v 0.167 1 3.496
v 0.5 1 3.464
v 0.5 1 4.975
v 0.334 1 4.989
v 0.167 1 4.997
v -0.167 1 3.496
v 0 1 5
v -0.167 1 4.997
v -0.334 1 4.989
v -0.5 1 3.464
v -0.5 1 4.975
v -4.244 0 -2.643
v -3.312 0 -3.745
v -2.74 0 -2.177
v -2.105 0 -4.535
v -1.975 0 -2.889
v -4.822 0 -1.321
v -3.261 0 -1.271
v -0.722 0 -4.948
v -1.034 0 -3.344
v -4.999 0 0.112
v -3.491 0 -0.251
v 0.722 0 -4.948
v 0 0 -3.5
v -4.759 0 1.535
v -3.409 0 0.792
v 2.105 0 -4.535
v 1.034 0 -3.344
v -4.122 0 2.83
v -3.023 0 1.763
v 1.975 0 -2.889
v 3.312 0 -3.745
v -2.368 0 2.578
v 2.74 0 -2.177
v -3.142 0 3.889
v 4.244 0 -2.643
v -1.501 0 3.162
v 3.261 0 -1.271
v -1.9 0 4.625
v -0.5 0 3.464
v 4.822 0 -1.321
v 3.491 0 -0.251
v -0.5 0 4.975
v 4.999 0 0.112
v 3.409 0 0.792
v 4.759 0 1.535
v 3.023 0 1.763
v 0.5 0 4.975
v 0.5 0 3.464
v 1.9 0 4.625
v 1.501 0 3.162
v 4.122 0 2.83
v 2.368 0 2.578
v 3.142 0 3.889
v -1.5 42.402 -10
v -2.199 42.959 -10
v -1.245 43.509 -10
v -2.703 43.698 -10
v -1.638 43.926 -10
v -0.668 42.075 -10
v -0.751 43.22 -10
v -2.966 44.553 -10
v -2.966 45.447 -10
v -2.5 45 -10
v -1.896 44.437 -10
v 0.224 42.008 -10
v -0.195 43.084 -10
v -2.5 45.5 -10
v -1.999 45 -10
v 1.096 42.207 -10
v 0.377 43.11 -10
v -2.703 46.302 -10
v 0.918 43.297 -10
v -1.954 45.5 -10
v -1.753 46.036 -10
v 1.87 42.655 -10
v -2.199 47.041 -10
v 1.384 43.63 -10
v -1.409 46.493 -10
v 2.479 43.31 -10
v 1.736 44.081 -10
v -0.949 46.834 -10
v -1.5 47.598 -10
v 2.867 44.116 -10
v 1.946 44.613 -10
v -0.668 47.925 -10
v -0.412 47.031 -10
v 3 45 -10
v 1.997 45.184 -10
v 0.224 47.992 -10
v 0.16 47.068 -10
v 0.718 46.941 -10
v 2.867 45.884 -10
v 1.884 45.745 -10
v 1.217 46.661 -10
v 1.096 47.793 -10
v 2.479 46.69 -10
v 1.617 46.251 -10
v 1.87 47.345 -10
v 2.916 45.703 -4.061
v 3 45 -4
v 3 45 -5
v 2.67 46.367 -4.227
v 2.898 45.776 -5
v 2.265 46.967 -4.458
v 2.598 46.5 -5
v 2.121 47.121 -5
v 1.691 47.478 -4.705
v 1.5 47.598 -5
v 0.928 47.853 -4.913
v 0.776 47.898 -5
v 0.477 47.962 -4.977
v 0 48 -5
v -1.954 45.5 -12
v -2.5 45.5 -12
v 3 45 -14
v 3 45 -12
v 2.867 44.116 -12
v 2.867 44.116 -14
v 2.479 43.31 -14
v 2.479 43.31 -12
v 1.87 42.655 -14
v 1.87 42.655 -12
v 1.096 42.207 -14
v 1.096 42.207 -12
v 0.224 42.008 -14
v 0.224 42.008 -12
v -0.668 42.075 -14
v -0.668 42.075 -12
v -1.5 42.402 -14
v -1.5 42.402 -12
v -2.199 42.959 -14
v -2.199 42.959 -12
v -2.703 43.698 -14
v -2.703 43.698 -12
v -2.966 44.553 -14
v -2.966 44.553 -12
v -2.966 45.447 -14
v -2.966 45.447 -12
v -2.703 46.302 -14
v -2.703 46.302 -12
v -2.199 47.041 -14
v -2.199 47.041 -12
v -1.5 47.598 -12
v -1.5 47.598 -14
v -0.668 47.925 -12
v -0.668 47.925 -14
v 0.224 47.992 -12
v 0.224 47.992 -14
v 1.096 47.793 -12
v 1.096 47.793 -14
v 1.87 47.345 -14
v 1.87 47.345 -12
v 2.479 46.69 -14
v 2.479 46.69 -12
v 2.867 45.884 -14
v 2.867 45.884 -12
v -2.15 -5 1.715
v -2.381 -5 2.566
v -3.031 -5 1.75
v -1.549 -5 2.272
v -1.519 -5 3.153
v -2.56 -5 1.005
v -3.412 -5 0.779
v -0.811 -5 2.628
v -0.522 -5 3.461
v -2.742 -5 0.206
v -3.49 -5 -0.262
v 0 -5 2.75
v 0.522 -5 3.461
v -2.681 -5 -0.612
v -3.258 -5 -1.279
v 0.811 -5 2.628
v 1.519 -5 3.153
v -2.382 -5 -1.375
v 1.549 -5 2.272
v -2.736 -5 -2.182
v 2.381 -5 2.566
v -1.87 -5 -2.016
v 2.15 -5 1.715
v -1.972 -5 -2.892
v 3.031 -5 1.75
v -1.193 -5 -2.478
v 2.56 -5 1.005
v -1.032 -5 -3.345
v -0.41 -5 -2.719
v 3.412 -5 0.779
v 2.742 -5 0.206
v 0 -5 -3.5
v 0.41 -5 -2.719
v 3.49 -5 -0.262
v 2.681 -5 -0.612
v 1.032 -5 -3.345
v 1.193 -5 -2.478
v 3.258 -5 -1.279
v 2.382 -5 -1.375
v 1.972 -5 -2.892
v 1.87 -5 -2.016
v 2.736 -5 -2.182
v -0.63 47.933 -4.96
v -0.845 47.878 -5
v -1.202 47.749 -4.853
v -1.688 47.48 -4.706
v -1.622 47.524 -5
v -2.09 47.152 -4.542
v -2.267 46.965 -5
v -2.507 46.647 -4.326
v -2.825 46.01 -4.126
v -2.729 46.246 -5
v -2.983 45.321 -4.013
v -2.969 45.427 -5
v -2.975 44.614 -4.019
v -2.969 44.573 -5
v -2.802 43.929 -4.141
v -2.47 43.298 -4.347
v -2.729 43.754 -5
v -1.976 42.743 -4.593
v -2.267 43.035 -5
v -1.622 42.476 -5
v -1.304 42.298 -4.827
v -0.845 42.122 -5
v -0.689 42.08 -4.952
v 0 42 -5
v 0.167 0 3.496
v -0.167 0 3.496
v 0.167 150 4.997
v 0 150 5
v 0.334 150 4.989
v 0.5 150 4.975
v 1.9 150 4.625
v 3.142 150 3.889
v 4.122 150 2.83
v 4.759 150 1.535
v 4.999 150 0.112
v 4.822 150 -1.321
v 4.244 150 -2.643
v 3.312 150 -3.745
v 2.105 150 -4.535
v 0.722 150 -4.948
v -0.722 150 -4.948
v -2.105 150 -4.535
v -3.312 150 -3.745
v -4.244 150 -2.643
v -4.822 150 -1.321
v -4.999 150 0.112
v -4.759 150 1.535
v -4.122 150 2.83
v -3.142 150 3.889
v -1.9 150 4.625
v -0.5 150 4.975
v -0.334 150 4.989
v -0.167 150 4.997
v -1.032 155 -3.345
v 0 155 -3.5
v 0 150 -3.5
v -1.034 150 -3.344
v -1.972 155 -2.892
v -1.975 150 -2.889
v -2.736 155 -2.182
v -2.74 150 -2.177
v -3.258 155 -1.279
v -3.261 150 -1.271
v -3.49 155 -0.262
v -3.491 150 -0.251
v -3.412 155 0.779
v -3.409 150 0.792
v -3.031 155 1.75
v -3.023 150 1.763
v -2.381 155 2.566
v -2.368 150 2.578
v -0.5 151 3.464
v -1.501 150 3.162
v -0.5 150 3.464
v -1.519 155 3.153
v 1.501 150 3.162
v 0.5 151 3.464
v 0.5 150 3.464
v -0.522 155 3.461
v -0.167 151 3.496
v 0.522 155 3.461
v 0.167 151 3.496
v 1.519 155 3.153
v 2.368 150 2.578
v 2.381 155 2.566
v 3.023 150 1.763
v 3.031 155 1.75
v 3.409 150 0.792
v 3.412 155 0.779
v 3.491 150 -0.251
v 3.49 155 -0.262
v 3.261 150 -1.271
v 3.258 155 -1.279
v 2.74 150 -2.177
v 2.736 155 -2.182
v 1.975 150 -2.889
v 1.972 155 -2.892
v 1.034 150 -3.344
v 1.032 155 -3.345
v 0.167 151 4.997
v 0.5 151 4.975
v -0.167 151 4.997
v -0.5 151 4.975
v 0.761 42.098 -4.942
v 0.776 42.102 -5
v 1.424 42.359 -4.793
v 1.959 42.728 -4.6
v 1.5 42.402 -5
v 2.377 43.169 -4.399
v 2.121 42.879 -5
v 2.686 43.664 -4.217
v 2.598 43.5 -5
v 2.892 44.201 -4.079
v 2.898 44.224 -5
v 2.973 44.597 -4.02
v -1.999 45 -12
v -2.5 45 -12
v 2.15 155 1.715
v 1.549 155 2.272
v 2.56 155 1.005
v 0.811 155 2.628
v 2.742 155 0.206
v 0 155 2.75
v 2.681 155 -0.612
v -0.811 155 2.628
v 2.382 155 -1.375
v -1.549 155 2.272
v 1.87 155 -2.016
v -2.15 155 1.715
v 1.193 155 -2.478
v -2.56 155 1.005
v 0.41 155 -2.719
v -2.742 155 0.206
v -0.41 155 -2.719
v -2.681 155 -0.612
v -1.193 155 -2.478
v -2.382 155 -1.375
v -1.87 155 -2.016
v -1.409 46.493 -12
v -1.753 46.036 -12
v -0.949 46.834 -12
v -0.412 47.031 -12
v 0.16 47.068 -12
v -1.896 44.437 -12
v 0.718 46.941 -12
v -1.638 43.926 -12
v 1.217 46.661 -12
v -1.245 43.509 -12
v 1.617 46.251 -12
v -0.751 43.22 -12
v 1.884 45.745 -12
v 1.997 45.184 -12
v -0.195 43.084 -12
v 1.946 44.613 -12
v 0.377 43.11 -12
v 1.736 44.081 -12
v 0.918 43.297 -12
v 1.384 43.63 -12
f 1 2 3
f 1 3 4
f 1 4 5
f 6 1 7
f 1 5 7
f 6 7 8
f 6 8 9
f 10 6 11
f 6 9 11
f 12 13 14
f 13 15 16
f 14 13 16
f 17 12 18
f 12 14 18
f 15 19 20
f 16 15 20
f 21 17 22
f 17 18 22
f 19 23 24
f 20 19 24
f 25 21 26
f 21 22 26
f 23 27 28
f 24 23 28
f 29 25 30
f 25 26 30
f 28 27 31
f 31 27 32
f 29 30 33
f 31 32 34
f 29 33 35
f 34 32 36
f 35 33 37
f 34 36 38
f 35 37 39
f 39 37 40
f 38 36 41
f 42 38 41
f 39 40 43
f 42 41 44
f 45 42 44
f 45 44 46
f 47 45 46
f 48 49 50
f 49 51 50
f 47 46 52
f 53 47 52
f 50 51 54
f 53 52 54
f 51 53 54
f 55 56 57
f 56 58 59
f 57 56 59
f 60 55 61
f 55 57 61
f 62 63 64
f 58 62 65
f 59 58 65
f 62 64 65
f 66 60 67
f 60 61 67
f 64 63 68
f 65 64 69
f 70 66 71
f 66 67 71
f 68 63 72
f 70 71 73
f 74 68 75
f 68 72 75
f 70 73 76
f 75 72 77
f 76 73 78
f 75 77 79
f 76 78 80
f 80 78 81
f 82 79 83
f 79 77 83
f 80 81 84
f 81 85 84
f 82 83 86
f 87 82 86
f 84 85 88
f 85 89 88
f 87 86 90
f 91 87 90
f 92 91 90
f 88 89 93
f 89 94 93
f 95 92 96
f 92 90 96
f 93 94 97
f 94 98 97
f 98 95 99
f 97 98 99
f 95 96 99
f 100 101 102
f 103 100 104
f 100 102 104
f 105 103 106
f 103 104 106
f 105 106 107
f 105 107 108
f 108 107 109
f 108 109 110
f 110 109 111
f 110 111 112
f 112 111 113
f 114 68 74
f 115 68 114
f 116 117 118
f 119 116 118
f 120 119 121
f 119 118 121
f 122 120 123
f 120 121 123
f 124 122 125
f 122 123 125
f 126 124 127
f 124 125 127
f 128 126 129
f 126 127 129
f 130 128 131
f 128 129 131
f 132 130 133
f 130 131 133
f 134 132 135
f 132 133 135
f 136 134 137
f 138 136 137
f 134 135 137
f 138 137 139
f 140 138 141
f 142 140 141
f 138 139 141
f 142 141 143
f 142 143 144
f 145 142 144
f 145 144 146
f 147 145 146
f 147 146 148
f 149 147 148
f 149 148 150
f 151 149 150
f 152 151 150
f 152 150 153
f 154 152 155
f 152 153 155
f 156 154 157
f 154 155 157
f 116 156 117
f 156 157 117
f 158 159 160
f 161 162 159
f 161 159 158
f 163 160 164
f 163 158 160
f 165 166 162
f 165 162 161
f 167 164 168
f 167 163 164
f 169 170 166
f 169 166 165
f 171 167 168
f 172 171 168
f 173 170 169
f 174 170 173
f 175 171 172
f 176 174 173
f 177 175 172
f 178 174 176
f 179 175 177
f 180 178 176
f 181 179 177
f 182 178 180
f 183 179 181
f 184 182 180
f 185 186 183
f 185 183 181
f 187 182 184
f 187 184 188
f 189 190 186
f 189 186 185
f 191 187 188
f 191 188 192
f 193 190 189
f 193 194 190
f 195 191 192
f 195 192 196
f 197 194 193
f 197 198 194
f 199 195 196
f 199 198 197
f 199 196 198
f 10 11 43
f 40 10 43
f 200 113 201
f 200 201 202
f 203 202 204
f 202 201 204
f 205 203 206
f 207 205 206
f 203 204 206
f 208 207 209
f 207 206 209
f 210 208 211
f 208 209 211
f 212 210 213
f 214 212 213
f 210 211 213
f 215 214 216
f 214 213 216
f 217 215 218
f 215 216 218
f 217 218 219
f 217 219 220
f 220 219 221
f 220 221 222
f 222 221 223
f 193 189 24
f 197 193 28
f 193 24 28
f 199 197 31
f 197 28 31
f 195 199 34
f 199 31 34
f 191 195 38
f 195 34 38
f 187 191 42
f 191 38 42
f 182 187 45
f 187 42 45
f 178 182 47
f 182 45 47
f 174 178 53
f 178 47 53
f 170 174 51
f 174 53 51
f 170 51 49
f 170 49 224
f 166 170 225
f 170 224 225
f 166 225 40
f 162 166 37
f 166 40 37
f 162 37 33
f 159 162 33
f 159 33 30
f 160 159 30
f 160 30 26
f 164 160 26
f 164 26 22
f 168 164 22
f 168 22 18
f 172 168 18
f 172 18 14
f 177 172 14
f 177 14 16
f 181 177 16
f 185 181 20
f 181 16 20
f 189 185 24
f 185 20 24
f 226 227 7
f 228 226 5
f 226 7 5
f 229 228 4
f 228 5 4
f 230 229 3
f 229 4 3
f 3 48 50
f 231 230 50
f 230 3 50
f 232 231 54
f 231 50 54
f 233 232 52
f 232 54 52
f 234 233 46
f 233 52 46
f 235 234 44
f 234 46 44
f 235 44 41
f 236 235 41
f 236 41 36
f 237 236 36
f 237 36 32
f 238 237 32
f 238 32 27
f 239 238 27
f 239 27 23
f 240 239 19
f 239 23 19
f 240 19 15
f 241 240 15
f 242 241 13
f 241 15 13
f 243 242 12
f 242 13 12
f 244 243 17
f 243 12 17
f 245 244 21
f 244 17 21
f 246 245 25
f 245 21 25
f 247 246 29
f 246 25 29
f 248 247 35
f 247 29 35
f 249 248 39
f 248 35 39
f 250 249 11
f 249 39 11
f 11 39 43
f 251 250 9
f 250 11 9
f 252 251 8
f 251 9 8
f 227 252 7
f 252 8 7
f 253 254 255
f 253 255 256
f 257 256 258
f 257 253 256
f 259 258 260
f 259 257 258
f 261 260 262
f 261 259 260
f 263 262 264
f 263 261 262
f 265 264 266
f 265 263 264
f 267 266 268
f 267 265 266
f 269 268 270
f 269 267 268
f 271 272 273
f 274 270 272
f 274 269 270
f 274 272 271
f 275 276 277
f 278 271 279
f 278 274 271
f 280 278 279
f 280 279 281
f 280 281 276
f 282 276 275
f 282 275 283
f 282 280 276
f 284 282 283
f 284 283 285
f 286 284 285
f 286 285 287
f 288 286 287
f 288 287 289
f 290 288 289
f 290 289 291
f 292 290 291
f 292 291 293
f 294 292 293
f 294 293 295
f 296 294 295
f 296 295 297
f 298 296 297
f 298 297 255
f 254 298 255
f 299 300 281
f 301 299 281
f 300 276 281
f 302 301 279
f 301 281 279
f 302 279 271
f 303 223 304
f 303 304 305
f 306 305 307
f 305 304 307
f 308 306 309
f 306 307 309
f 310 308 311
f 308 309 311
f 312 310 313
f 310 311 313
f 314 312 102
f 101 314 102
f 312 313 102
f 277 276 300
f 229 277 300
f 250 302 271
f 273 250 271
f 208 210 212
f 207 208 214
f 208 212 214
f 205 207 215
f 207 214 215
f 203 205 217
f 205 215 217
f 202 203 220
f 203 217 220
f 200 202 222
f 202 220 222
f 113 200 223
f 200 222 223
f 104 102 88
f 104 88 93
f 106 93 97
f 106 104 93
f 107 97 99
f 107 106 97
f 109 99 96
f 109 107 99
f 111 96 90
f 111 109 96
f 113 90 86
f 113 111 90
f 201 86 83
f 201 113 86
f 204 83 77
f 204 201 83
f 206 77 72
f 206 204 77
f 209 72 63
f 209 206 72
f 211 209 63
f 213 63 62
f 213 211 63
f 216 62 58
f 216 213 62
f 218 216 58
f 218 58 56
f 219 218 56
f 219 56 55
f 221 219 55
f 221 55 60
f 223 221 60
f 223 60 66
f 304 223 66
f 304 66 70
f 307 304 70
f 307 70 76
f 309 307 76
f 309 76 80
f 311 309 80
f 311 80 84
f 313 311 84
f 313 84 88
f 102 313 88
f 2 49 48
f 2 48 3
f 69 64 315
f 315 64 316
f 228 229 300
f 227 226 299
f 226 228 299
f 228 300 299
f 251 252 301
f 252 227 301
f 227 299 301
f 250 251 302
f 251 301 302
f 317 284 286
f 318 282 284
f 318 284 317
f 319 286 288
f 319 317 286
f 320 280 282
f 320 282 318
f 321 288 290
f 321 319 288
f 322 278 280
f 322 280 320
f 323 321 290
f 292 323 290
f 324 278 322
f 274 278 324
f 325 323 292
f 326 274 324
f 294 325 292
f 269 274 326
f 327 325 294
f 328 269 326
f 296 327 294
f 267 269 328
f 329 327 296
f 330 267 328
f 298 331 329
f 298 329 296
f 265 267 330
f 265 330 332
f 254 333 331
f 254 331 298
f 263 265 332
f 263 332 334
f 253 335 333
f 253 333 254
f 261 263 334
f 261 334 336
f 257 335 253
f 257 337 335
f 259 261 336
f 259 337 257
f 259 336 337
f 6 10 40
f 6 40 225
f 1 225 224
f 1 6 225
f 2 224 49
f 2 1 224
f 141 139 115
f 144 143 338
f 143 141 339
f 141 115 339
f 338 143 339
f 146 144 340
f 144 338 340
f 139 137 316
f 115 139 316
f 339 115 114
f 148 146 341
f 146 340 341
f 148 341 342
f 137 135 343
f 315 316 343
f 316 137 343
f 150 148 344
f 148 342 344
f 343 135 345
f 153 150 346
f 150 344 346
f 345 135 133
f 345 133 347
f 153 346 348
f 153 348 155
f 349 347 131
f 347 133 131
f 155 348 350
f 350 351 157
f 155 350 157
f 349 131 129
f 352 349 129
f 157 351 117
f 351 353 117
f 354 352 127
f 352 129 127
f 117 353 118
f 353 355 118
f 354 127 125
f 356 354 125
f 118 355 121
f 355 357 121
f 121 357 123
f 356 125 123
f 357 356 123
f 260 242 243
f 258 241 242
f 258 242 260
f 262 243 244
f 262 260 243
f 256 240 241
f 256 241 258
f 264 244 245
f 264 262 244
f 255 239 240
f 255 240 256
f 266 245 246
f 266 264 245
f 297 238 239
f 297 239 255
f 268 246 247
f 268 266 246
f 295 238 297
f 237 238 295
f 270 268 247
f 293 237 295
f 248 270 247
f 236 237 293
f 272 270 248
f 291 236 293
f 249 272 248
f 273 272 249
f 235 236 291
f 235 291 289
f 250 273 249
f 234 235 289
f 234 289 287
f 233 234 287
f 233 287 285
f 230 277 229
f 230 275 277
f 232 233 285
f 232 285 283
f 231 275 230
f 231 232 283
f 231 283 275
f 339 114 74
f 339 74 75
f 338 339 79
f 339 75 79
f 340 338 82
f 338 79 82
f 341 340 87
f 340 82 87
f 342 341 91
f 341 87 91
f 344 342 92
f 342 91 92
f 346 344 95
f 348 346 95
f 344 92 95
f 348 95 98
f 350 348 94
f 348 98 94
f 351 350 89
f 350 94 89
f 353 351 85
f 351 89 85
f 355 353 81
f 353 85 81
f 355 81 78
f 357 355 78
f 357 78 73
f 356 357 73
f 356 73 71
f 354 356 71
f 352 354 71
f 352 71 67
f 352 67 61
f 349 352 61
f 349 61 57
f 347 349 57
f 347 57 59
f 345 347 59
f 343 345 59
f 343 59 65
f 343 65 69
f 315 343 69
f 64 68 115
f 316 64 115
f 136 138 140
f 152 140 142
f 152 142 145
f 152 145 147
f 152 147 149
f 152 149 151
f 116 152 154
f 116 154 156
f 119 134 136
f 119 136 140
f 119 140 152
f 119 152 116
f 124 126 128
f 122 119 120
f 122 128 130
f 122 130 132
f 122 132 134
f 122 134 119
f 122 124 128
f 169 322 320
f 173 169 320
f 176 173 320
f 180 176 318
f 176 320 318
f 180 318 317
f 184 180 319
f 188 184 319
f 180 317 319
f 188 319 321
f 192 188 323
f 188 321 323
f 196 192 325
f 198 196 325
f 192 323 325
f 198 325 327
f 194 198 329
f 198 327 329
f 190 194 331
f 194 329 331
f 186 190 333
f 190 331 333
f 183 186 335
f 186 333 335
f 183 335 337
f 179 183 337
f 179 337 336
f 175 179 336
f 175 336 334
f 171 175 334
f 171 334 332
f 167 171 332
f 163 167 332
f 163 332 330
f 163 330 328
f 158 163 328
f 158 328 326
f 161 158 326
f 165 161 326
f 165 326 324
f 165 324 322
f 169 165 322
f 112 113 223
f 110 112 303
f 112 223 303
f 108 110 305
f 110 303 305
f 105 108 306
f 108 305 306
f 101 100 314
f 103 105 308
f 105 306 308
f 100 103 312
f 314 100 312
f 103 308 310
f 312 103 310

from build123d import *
from build123d.topology import SkipClean

# Parameters (mm, degrees)
SKETCH1_R                            = 5
BOSS_EXTRUDE1_DEPTH                  = 150
SKETCH4_R                            = 3
BOSS_EXTRUDE2_DEPTH                  = 5
BOSS_EXTRUDE2_DIRECTION_2_REACH      = 152.416
BOSS_EXTRUDE2_DIRECTION_2_END_RADIUS = 5
SKETCH5_R                            = 2
BOSS_EXTRUDE3_DEPTH                  = 2
SKETCH6_R                            = 3
BOSS_EXTRUDE4_DEPTH                  = 2
SKETCH7_R                            = 3.5
BOSS_EXTRUDE5_DEPTH                  = 5
BOSS_EXTRUDE6_START                  = 5
SKETCH8_R                            = 3.5
BOSS_EXTRUDE6_DEPTH                  = 5
SKETCH9_R                            = 2.75
CUT_EXTRUDE1_DEPTH                   = 168
CUT_EXTRUDE4_REACH                   = 158.24
CUT_EXTRUDE4_END_RADIUS              = 3.5
BOSS_EXTRUDE7_START                  = 1
BOSS_EXTRUDE7_DEPTH                  = 1
BOSS_EXTRUDE8_REACH                  = 157.812
BOSS_EXTRUDE8_END_RADIUS             = 2
SKETCH18_W                           = 2
SKETCH18_H                           = 0.5


with BuildPart() as part:
    # Sketch1 → Boss-Extrude1 (new body)
    with BuildSketch(Plane(origin=(0, 0, 0), x_dir=(1, 0, 0), z_dir=(0, 1, 0))):
        with Locations(Location((0, 0, 0), (0, 0, 270))):
            Circle(SKETCH1_R)
    extrude(amount=BOSS_EXTRUDE1_DEPTH)

    # Sketch7 → Boss-Extrude5 (add)
    with BuildSketch(Plane.XZ):
        with Locations(Location((0, 0, 0), (0, 0, 270))):
            Circle(SKETCH7_R)
    extrude(amount=BOSS_EXTRUDE5_DEPTH)

    # Sketch8 → Boss-Extrude6 (add)
    with BuildSketch(Plane(origin=(0, 150, 0), x_dir=(1, 0, 0), z_dir=(0, 1, 0)).offset(BOSS_EXTRUDE6_START)):
        with Locations(Location((0, 0, 0), (0, 0, 90))):
            Circle(SKETCH8_R)
    extrude(amount=-BOSS_EXTRUDE6_DEPTH)

    # Sketch9 → Cut-Extrude1 (cut)
    with BuildSketch(Plane(origin=(0, 155, 0), x_dir=(1, 0, 0), z_dir=(0, 1, 0))):
        with Locations(Location((0, 0, 0), (0, 0, 270))):
            Circle(SKETCH9_R)
    extrude(amount=-CUT_EXTRUDE1_DEPTH, mode=Mode.SUBTRACT)

    # Cut-Extrude4: up to this cylinder (the profile starts outside it)
    cut_extrude4_end = Plane(origin=(0, 0.5, 0), z_dir=(0, 1, 0)) * Cylinder(CUT_EXTRUDE4_END_RADIUS, 324.48, mode=Mode.PRIVATE)
    # Sketch14 → Cut-Extrude4 (cut, up to the surface)
    with BuildSketch(Plane.XY.offset(5), mode=Mode.PRIVATE) as cut_extrude4_sk1:
        Polygon((0, 0), (0.5, 0), (0.5, 1), (-0.5, 1), (-0.5, 0), align=None)
    cut_extrude4_tool1 = extrude(cut_extrude4_sk1.sketch, amount=-CUT_EXTRUDE4_REACH, mode=Mode.PRIVATE) - cut_extrude4_end
    add(cut_extrude4_tool1.solids().sort_by_distance((0, 0.5, 5))[0], mode=Mode.SUBTRACT)

    # Sketch16 → Boss-Extrude7 (add)
    with BuildSketch(Plane(origin=(0, 150, 0), x_dir=(1, 0, 0), z_dir=(0, 1, 0)).offset(BOSS_EXTRUDE7_START)):
        with BuildLine():
            Line((0.5, -3.5), (0.5, -4.974937186))
            ThreePointArc((0.5, -4.974937186), (0, -5), (-0.5, -4.974937186))
            Line((-0.5, -4.974937186), (-0.5, -3.5))
            Line((-0.5, -3.5), (-0.5, -3.464101615))
            ThreePointArc((-0.5, -3.464101615), (0, -3.5), (0.5, -3.464101615))
            Line((0.5, -3.464101615), (0.5, -3.5))
        make_face()
    extrude(amount=-BOSS_EXTRUDE7_DEPTH)


with BuildPart() as body_2:
    # Sketch4 → Boss-Extrude2 (new body)
    with BuildSketch(Plane.XY.offset(-5)):
        with Locations((0, 45)):
            Circle(SKETCH4_R)
    extrude(amount=-BOSS_EXTRUDE2_DEPTH)

    # Boss-Extrude2 direction 2: up to this cylinder (the profile starts outside it)
    with SkipClean():  # the faces are left unmerged after this step: merging them gives an invalid solid
        boss_extrude2_direction_2_end = Plane(origin=(0, 45, 0), z_dir=(0, -1, 0)) * Cylinder(BOSS_EXTRUDE2_DIRECTION_2_END_RADIUS, 315.832, mode=Mode.PRIVATE)
        # Sketch4 → Boss-Extrude2 direction 2 (add, up to the surface)
        with BuildSketch(Plane.XY.offset(-5), mode=Mode.PRIVATE) as boss_extrude2_direction_2_sk1:
            with Locations((0, 45)):
                Circle(SKETCH4_R)
        boss_extrude2_direction_2_tool1 = extrude(boss_extrude2_direction_2_sk1.sketch, amount=BOSS_EXTRUDE2_DIRECTION_2_REACH, mode=Mode.PRIVATE) - boss_extrude2_direction_2_end
        add(boss_extrude2_direction_2_tool1.solids().sort_by_distance((0, 45, -5))[0])
        add(boss_extrude2_direction_2_tool1.solids().sort_by_distance((0, 45, -5))[1])

    # Sketch5 → Boss-Extrude3 (add)
    with SkipClean():  # the faces are left unmerged after this step: merging them gives an invalid solid
        with BuildSketch(Plane(origin=(0, 0, -10), x_dir=(-1, 0, 0), z_dir=(0, 0, -1))):
            with Locations((0, 45.074078642)):
                Circle(SKETCH5_R)
        extrude(amount=BOSS_EXTRUDE3_DEPTH)

    # Sketch6 → Boss-Extrude4 (add)
    with SkipClean():  # the faces are left unmerged after this step: merging them gives an invalid solid
        with BuildSketch(Plane(origin=(0, 0, -12), x_dir=(-1, 0, 0), z_dir=(0, 0, -1))):
            with Locations(Location((0, 45, 0), (0, 0, 180))):
                Circle(SKETCH6_R)
        extrude(amount=BOSS_EXTRUDE4_DEPTH)

    # Boss-Extrude8: up to this cylinder (the profile starts outside it)
    with SkipClean():  # the faces are left unmerged after this step: merging them gives an invalid solid
        boss_extrude8_end = Plane(origin=(0, 45.074078642, -11), z_dir=(0, 0, 1)) * Cylinder(BOSS_EXTRUDE8_END_RADIUS, 320.624, mode=Mode.PRIVATE)
        # Sketch18 → Boss-Extrude8 (add, up to the surface)
        with BuildSketch(Plane(origin=(-2.5, 0, 0), x_dir=(0, 0, -1), z_dir=(1, 0, 0)), mode=Mode.PRIVATE) as boss_extrude8_sk1:
            with Locations((11, 45.25)):
                Rectangle(SKETCH18_W, SKETCH18_H)
        boss_extrude8_tool1 = extrude(boss_extrude8_sk1.sketch, amount=BOSS_EXTRUDE8_REACH, mode=Mode.PRIVATE) - boss_extrude8_end
        add(boss_extrude8_tool1.solids().sort_by_distance((-2.5, 45.25, -11))[0])


solid = Compound([part.part, body_2.part])
